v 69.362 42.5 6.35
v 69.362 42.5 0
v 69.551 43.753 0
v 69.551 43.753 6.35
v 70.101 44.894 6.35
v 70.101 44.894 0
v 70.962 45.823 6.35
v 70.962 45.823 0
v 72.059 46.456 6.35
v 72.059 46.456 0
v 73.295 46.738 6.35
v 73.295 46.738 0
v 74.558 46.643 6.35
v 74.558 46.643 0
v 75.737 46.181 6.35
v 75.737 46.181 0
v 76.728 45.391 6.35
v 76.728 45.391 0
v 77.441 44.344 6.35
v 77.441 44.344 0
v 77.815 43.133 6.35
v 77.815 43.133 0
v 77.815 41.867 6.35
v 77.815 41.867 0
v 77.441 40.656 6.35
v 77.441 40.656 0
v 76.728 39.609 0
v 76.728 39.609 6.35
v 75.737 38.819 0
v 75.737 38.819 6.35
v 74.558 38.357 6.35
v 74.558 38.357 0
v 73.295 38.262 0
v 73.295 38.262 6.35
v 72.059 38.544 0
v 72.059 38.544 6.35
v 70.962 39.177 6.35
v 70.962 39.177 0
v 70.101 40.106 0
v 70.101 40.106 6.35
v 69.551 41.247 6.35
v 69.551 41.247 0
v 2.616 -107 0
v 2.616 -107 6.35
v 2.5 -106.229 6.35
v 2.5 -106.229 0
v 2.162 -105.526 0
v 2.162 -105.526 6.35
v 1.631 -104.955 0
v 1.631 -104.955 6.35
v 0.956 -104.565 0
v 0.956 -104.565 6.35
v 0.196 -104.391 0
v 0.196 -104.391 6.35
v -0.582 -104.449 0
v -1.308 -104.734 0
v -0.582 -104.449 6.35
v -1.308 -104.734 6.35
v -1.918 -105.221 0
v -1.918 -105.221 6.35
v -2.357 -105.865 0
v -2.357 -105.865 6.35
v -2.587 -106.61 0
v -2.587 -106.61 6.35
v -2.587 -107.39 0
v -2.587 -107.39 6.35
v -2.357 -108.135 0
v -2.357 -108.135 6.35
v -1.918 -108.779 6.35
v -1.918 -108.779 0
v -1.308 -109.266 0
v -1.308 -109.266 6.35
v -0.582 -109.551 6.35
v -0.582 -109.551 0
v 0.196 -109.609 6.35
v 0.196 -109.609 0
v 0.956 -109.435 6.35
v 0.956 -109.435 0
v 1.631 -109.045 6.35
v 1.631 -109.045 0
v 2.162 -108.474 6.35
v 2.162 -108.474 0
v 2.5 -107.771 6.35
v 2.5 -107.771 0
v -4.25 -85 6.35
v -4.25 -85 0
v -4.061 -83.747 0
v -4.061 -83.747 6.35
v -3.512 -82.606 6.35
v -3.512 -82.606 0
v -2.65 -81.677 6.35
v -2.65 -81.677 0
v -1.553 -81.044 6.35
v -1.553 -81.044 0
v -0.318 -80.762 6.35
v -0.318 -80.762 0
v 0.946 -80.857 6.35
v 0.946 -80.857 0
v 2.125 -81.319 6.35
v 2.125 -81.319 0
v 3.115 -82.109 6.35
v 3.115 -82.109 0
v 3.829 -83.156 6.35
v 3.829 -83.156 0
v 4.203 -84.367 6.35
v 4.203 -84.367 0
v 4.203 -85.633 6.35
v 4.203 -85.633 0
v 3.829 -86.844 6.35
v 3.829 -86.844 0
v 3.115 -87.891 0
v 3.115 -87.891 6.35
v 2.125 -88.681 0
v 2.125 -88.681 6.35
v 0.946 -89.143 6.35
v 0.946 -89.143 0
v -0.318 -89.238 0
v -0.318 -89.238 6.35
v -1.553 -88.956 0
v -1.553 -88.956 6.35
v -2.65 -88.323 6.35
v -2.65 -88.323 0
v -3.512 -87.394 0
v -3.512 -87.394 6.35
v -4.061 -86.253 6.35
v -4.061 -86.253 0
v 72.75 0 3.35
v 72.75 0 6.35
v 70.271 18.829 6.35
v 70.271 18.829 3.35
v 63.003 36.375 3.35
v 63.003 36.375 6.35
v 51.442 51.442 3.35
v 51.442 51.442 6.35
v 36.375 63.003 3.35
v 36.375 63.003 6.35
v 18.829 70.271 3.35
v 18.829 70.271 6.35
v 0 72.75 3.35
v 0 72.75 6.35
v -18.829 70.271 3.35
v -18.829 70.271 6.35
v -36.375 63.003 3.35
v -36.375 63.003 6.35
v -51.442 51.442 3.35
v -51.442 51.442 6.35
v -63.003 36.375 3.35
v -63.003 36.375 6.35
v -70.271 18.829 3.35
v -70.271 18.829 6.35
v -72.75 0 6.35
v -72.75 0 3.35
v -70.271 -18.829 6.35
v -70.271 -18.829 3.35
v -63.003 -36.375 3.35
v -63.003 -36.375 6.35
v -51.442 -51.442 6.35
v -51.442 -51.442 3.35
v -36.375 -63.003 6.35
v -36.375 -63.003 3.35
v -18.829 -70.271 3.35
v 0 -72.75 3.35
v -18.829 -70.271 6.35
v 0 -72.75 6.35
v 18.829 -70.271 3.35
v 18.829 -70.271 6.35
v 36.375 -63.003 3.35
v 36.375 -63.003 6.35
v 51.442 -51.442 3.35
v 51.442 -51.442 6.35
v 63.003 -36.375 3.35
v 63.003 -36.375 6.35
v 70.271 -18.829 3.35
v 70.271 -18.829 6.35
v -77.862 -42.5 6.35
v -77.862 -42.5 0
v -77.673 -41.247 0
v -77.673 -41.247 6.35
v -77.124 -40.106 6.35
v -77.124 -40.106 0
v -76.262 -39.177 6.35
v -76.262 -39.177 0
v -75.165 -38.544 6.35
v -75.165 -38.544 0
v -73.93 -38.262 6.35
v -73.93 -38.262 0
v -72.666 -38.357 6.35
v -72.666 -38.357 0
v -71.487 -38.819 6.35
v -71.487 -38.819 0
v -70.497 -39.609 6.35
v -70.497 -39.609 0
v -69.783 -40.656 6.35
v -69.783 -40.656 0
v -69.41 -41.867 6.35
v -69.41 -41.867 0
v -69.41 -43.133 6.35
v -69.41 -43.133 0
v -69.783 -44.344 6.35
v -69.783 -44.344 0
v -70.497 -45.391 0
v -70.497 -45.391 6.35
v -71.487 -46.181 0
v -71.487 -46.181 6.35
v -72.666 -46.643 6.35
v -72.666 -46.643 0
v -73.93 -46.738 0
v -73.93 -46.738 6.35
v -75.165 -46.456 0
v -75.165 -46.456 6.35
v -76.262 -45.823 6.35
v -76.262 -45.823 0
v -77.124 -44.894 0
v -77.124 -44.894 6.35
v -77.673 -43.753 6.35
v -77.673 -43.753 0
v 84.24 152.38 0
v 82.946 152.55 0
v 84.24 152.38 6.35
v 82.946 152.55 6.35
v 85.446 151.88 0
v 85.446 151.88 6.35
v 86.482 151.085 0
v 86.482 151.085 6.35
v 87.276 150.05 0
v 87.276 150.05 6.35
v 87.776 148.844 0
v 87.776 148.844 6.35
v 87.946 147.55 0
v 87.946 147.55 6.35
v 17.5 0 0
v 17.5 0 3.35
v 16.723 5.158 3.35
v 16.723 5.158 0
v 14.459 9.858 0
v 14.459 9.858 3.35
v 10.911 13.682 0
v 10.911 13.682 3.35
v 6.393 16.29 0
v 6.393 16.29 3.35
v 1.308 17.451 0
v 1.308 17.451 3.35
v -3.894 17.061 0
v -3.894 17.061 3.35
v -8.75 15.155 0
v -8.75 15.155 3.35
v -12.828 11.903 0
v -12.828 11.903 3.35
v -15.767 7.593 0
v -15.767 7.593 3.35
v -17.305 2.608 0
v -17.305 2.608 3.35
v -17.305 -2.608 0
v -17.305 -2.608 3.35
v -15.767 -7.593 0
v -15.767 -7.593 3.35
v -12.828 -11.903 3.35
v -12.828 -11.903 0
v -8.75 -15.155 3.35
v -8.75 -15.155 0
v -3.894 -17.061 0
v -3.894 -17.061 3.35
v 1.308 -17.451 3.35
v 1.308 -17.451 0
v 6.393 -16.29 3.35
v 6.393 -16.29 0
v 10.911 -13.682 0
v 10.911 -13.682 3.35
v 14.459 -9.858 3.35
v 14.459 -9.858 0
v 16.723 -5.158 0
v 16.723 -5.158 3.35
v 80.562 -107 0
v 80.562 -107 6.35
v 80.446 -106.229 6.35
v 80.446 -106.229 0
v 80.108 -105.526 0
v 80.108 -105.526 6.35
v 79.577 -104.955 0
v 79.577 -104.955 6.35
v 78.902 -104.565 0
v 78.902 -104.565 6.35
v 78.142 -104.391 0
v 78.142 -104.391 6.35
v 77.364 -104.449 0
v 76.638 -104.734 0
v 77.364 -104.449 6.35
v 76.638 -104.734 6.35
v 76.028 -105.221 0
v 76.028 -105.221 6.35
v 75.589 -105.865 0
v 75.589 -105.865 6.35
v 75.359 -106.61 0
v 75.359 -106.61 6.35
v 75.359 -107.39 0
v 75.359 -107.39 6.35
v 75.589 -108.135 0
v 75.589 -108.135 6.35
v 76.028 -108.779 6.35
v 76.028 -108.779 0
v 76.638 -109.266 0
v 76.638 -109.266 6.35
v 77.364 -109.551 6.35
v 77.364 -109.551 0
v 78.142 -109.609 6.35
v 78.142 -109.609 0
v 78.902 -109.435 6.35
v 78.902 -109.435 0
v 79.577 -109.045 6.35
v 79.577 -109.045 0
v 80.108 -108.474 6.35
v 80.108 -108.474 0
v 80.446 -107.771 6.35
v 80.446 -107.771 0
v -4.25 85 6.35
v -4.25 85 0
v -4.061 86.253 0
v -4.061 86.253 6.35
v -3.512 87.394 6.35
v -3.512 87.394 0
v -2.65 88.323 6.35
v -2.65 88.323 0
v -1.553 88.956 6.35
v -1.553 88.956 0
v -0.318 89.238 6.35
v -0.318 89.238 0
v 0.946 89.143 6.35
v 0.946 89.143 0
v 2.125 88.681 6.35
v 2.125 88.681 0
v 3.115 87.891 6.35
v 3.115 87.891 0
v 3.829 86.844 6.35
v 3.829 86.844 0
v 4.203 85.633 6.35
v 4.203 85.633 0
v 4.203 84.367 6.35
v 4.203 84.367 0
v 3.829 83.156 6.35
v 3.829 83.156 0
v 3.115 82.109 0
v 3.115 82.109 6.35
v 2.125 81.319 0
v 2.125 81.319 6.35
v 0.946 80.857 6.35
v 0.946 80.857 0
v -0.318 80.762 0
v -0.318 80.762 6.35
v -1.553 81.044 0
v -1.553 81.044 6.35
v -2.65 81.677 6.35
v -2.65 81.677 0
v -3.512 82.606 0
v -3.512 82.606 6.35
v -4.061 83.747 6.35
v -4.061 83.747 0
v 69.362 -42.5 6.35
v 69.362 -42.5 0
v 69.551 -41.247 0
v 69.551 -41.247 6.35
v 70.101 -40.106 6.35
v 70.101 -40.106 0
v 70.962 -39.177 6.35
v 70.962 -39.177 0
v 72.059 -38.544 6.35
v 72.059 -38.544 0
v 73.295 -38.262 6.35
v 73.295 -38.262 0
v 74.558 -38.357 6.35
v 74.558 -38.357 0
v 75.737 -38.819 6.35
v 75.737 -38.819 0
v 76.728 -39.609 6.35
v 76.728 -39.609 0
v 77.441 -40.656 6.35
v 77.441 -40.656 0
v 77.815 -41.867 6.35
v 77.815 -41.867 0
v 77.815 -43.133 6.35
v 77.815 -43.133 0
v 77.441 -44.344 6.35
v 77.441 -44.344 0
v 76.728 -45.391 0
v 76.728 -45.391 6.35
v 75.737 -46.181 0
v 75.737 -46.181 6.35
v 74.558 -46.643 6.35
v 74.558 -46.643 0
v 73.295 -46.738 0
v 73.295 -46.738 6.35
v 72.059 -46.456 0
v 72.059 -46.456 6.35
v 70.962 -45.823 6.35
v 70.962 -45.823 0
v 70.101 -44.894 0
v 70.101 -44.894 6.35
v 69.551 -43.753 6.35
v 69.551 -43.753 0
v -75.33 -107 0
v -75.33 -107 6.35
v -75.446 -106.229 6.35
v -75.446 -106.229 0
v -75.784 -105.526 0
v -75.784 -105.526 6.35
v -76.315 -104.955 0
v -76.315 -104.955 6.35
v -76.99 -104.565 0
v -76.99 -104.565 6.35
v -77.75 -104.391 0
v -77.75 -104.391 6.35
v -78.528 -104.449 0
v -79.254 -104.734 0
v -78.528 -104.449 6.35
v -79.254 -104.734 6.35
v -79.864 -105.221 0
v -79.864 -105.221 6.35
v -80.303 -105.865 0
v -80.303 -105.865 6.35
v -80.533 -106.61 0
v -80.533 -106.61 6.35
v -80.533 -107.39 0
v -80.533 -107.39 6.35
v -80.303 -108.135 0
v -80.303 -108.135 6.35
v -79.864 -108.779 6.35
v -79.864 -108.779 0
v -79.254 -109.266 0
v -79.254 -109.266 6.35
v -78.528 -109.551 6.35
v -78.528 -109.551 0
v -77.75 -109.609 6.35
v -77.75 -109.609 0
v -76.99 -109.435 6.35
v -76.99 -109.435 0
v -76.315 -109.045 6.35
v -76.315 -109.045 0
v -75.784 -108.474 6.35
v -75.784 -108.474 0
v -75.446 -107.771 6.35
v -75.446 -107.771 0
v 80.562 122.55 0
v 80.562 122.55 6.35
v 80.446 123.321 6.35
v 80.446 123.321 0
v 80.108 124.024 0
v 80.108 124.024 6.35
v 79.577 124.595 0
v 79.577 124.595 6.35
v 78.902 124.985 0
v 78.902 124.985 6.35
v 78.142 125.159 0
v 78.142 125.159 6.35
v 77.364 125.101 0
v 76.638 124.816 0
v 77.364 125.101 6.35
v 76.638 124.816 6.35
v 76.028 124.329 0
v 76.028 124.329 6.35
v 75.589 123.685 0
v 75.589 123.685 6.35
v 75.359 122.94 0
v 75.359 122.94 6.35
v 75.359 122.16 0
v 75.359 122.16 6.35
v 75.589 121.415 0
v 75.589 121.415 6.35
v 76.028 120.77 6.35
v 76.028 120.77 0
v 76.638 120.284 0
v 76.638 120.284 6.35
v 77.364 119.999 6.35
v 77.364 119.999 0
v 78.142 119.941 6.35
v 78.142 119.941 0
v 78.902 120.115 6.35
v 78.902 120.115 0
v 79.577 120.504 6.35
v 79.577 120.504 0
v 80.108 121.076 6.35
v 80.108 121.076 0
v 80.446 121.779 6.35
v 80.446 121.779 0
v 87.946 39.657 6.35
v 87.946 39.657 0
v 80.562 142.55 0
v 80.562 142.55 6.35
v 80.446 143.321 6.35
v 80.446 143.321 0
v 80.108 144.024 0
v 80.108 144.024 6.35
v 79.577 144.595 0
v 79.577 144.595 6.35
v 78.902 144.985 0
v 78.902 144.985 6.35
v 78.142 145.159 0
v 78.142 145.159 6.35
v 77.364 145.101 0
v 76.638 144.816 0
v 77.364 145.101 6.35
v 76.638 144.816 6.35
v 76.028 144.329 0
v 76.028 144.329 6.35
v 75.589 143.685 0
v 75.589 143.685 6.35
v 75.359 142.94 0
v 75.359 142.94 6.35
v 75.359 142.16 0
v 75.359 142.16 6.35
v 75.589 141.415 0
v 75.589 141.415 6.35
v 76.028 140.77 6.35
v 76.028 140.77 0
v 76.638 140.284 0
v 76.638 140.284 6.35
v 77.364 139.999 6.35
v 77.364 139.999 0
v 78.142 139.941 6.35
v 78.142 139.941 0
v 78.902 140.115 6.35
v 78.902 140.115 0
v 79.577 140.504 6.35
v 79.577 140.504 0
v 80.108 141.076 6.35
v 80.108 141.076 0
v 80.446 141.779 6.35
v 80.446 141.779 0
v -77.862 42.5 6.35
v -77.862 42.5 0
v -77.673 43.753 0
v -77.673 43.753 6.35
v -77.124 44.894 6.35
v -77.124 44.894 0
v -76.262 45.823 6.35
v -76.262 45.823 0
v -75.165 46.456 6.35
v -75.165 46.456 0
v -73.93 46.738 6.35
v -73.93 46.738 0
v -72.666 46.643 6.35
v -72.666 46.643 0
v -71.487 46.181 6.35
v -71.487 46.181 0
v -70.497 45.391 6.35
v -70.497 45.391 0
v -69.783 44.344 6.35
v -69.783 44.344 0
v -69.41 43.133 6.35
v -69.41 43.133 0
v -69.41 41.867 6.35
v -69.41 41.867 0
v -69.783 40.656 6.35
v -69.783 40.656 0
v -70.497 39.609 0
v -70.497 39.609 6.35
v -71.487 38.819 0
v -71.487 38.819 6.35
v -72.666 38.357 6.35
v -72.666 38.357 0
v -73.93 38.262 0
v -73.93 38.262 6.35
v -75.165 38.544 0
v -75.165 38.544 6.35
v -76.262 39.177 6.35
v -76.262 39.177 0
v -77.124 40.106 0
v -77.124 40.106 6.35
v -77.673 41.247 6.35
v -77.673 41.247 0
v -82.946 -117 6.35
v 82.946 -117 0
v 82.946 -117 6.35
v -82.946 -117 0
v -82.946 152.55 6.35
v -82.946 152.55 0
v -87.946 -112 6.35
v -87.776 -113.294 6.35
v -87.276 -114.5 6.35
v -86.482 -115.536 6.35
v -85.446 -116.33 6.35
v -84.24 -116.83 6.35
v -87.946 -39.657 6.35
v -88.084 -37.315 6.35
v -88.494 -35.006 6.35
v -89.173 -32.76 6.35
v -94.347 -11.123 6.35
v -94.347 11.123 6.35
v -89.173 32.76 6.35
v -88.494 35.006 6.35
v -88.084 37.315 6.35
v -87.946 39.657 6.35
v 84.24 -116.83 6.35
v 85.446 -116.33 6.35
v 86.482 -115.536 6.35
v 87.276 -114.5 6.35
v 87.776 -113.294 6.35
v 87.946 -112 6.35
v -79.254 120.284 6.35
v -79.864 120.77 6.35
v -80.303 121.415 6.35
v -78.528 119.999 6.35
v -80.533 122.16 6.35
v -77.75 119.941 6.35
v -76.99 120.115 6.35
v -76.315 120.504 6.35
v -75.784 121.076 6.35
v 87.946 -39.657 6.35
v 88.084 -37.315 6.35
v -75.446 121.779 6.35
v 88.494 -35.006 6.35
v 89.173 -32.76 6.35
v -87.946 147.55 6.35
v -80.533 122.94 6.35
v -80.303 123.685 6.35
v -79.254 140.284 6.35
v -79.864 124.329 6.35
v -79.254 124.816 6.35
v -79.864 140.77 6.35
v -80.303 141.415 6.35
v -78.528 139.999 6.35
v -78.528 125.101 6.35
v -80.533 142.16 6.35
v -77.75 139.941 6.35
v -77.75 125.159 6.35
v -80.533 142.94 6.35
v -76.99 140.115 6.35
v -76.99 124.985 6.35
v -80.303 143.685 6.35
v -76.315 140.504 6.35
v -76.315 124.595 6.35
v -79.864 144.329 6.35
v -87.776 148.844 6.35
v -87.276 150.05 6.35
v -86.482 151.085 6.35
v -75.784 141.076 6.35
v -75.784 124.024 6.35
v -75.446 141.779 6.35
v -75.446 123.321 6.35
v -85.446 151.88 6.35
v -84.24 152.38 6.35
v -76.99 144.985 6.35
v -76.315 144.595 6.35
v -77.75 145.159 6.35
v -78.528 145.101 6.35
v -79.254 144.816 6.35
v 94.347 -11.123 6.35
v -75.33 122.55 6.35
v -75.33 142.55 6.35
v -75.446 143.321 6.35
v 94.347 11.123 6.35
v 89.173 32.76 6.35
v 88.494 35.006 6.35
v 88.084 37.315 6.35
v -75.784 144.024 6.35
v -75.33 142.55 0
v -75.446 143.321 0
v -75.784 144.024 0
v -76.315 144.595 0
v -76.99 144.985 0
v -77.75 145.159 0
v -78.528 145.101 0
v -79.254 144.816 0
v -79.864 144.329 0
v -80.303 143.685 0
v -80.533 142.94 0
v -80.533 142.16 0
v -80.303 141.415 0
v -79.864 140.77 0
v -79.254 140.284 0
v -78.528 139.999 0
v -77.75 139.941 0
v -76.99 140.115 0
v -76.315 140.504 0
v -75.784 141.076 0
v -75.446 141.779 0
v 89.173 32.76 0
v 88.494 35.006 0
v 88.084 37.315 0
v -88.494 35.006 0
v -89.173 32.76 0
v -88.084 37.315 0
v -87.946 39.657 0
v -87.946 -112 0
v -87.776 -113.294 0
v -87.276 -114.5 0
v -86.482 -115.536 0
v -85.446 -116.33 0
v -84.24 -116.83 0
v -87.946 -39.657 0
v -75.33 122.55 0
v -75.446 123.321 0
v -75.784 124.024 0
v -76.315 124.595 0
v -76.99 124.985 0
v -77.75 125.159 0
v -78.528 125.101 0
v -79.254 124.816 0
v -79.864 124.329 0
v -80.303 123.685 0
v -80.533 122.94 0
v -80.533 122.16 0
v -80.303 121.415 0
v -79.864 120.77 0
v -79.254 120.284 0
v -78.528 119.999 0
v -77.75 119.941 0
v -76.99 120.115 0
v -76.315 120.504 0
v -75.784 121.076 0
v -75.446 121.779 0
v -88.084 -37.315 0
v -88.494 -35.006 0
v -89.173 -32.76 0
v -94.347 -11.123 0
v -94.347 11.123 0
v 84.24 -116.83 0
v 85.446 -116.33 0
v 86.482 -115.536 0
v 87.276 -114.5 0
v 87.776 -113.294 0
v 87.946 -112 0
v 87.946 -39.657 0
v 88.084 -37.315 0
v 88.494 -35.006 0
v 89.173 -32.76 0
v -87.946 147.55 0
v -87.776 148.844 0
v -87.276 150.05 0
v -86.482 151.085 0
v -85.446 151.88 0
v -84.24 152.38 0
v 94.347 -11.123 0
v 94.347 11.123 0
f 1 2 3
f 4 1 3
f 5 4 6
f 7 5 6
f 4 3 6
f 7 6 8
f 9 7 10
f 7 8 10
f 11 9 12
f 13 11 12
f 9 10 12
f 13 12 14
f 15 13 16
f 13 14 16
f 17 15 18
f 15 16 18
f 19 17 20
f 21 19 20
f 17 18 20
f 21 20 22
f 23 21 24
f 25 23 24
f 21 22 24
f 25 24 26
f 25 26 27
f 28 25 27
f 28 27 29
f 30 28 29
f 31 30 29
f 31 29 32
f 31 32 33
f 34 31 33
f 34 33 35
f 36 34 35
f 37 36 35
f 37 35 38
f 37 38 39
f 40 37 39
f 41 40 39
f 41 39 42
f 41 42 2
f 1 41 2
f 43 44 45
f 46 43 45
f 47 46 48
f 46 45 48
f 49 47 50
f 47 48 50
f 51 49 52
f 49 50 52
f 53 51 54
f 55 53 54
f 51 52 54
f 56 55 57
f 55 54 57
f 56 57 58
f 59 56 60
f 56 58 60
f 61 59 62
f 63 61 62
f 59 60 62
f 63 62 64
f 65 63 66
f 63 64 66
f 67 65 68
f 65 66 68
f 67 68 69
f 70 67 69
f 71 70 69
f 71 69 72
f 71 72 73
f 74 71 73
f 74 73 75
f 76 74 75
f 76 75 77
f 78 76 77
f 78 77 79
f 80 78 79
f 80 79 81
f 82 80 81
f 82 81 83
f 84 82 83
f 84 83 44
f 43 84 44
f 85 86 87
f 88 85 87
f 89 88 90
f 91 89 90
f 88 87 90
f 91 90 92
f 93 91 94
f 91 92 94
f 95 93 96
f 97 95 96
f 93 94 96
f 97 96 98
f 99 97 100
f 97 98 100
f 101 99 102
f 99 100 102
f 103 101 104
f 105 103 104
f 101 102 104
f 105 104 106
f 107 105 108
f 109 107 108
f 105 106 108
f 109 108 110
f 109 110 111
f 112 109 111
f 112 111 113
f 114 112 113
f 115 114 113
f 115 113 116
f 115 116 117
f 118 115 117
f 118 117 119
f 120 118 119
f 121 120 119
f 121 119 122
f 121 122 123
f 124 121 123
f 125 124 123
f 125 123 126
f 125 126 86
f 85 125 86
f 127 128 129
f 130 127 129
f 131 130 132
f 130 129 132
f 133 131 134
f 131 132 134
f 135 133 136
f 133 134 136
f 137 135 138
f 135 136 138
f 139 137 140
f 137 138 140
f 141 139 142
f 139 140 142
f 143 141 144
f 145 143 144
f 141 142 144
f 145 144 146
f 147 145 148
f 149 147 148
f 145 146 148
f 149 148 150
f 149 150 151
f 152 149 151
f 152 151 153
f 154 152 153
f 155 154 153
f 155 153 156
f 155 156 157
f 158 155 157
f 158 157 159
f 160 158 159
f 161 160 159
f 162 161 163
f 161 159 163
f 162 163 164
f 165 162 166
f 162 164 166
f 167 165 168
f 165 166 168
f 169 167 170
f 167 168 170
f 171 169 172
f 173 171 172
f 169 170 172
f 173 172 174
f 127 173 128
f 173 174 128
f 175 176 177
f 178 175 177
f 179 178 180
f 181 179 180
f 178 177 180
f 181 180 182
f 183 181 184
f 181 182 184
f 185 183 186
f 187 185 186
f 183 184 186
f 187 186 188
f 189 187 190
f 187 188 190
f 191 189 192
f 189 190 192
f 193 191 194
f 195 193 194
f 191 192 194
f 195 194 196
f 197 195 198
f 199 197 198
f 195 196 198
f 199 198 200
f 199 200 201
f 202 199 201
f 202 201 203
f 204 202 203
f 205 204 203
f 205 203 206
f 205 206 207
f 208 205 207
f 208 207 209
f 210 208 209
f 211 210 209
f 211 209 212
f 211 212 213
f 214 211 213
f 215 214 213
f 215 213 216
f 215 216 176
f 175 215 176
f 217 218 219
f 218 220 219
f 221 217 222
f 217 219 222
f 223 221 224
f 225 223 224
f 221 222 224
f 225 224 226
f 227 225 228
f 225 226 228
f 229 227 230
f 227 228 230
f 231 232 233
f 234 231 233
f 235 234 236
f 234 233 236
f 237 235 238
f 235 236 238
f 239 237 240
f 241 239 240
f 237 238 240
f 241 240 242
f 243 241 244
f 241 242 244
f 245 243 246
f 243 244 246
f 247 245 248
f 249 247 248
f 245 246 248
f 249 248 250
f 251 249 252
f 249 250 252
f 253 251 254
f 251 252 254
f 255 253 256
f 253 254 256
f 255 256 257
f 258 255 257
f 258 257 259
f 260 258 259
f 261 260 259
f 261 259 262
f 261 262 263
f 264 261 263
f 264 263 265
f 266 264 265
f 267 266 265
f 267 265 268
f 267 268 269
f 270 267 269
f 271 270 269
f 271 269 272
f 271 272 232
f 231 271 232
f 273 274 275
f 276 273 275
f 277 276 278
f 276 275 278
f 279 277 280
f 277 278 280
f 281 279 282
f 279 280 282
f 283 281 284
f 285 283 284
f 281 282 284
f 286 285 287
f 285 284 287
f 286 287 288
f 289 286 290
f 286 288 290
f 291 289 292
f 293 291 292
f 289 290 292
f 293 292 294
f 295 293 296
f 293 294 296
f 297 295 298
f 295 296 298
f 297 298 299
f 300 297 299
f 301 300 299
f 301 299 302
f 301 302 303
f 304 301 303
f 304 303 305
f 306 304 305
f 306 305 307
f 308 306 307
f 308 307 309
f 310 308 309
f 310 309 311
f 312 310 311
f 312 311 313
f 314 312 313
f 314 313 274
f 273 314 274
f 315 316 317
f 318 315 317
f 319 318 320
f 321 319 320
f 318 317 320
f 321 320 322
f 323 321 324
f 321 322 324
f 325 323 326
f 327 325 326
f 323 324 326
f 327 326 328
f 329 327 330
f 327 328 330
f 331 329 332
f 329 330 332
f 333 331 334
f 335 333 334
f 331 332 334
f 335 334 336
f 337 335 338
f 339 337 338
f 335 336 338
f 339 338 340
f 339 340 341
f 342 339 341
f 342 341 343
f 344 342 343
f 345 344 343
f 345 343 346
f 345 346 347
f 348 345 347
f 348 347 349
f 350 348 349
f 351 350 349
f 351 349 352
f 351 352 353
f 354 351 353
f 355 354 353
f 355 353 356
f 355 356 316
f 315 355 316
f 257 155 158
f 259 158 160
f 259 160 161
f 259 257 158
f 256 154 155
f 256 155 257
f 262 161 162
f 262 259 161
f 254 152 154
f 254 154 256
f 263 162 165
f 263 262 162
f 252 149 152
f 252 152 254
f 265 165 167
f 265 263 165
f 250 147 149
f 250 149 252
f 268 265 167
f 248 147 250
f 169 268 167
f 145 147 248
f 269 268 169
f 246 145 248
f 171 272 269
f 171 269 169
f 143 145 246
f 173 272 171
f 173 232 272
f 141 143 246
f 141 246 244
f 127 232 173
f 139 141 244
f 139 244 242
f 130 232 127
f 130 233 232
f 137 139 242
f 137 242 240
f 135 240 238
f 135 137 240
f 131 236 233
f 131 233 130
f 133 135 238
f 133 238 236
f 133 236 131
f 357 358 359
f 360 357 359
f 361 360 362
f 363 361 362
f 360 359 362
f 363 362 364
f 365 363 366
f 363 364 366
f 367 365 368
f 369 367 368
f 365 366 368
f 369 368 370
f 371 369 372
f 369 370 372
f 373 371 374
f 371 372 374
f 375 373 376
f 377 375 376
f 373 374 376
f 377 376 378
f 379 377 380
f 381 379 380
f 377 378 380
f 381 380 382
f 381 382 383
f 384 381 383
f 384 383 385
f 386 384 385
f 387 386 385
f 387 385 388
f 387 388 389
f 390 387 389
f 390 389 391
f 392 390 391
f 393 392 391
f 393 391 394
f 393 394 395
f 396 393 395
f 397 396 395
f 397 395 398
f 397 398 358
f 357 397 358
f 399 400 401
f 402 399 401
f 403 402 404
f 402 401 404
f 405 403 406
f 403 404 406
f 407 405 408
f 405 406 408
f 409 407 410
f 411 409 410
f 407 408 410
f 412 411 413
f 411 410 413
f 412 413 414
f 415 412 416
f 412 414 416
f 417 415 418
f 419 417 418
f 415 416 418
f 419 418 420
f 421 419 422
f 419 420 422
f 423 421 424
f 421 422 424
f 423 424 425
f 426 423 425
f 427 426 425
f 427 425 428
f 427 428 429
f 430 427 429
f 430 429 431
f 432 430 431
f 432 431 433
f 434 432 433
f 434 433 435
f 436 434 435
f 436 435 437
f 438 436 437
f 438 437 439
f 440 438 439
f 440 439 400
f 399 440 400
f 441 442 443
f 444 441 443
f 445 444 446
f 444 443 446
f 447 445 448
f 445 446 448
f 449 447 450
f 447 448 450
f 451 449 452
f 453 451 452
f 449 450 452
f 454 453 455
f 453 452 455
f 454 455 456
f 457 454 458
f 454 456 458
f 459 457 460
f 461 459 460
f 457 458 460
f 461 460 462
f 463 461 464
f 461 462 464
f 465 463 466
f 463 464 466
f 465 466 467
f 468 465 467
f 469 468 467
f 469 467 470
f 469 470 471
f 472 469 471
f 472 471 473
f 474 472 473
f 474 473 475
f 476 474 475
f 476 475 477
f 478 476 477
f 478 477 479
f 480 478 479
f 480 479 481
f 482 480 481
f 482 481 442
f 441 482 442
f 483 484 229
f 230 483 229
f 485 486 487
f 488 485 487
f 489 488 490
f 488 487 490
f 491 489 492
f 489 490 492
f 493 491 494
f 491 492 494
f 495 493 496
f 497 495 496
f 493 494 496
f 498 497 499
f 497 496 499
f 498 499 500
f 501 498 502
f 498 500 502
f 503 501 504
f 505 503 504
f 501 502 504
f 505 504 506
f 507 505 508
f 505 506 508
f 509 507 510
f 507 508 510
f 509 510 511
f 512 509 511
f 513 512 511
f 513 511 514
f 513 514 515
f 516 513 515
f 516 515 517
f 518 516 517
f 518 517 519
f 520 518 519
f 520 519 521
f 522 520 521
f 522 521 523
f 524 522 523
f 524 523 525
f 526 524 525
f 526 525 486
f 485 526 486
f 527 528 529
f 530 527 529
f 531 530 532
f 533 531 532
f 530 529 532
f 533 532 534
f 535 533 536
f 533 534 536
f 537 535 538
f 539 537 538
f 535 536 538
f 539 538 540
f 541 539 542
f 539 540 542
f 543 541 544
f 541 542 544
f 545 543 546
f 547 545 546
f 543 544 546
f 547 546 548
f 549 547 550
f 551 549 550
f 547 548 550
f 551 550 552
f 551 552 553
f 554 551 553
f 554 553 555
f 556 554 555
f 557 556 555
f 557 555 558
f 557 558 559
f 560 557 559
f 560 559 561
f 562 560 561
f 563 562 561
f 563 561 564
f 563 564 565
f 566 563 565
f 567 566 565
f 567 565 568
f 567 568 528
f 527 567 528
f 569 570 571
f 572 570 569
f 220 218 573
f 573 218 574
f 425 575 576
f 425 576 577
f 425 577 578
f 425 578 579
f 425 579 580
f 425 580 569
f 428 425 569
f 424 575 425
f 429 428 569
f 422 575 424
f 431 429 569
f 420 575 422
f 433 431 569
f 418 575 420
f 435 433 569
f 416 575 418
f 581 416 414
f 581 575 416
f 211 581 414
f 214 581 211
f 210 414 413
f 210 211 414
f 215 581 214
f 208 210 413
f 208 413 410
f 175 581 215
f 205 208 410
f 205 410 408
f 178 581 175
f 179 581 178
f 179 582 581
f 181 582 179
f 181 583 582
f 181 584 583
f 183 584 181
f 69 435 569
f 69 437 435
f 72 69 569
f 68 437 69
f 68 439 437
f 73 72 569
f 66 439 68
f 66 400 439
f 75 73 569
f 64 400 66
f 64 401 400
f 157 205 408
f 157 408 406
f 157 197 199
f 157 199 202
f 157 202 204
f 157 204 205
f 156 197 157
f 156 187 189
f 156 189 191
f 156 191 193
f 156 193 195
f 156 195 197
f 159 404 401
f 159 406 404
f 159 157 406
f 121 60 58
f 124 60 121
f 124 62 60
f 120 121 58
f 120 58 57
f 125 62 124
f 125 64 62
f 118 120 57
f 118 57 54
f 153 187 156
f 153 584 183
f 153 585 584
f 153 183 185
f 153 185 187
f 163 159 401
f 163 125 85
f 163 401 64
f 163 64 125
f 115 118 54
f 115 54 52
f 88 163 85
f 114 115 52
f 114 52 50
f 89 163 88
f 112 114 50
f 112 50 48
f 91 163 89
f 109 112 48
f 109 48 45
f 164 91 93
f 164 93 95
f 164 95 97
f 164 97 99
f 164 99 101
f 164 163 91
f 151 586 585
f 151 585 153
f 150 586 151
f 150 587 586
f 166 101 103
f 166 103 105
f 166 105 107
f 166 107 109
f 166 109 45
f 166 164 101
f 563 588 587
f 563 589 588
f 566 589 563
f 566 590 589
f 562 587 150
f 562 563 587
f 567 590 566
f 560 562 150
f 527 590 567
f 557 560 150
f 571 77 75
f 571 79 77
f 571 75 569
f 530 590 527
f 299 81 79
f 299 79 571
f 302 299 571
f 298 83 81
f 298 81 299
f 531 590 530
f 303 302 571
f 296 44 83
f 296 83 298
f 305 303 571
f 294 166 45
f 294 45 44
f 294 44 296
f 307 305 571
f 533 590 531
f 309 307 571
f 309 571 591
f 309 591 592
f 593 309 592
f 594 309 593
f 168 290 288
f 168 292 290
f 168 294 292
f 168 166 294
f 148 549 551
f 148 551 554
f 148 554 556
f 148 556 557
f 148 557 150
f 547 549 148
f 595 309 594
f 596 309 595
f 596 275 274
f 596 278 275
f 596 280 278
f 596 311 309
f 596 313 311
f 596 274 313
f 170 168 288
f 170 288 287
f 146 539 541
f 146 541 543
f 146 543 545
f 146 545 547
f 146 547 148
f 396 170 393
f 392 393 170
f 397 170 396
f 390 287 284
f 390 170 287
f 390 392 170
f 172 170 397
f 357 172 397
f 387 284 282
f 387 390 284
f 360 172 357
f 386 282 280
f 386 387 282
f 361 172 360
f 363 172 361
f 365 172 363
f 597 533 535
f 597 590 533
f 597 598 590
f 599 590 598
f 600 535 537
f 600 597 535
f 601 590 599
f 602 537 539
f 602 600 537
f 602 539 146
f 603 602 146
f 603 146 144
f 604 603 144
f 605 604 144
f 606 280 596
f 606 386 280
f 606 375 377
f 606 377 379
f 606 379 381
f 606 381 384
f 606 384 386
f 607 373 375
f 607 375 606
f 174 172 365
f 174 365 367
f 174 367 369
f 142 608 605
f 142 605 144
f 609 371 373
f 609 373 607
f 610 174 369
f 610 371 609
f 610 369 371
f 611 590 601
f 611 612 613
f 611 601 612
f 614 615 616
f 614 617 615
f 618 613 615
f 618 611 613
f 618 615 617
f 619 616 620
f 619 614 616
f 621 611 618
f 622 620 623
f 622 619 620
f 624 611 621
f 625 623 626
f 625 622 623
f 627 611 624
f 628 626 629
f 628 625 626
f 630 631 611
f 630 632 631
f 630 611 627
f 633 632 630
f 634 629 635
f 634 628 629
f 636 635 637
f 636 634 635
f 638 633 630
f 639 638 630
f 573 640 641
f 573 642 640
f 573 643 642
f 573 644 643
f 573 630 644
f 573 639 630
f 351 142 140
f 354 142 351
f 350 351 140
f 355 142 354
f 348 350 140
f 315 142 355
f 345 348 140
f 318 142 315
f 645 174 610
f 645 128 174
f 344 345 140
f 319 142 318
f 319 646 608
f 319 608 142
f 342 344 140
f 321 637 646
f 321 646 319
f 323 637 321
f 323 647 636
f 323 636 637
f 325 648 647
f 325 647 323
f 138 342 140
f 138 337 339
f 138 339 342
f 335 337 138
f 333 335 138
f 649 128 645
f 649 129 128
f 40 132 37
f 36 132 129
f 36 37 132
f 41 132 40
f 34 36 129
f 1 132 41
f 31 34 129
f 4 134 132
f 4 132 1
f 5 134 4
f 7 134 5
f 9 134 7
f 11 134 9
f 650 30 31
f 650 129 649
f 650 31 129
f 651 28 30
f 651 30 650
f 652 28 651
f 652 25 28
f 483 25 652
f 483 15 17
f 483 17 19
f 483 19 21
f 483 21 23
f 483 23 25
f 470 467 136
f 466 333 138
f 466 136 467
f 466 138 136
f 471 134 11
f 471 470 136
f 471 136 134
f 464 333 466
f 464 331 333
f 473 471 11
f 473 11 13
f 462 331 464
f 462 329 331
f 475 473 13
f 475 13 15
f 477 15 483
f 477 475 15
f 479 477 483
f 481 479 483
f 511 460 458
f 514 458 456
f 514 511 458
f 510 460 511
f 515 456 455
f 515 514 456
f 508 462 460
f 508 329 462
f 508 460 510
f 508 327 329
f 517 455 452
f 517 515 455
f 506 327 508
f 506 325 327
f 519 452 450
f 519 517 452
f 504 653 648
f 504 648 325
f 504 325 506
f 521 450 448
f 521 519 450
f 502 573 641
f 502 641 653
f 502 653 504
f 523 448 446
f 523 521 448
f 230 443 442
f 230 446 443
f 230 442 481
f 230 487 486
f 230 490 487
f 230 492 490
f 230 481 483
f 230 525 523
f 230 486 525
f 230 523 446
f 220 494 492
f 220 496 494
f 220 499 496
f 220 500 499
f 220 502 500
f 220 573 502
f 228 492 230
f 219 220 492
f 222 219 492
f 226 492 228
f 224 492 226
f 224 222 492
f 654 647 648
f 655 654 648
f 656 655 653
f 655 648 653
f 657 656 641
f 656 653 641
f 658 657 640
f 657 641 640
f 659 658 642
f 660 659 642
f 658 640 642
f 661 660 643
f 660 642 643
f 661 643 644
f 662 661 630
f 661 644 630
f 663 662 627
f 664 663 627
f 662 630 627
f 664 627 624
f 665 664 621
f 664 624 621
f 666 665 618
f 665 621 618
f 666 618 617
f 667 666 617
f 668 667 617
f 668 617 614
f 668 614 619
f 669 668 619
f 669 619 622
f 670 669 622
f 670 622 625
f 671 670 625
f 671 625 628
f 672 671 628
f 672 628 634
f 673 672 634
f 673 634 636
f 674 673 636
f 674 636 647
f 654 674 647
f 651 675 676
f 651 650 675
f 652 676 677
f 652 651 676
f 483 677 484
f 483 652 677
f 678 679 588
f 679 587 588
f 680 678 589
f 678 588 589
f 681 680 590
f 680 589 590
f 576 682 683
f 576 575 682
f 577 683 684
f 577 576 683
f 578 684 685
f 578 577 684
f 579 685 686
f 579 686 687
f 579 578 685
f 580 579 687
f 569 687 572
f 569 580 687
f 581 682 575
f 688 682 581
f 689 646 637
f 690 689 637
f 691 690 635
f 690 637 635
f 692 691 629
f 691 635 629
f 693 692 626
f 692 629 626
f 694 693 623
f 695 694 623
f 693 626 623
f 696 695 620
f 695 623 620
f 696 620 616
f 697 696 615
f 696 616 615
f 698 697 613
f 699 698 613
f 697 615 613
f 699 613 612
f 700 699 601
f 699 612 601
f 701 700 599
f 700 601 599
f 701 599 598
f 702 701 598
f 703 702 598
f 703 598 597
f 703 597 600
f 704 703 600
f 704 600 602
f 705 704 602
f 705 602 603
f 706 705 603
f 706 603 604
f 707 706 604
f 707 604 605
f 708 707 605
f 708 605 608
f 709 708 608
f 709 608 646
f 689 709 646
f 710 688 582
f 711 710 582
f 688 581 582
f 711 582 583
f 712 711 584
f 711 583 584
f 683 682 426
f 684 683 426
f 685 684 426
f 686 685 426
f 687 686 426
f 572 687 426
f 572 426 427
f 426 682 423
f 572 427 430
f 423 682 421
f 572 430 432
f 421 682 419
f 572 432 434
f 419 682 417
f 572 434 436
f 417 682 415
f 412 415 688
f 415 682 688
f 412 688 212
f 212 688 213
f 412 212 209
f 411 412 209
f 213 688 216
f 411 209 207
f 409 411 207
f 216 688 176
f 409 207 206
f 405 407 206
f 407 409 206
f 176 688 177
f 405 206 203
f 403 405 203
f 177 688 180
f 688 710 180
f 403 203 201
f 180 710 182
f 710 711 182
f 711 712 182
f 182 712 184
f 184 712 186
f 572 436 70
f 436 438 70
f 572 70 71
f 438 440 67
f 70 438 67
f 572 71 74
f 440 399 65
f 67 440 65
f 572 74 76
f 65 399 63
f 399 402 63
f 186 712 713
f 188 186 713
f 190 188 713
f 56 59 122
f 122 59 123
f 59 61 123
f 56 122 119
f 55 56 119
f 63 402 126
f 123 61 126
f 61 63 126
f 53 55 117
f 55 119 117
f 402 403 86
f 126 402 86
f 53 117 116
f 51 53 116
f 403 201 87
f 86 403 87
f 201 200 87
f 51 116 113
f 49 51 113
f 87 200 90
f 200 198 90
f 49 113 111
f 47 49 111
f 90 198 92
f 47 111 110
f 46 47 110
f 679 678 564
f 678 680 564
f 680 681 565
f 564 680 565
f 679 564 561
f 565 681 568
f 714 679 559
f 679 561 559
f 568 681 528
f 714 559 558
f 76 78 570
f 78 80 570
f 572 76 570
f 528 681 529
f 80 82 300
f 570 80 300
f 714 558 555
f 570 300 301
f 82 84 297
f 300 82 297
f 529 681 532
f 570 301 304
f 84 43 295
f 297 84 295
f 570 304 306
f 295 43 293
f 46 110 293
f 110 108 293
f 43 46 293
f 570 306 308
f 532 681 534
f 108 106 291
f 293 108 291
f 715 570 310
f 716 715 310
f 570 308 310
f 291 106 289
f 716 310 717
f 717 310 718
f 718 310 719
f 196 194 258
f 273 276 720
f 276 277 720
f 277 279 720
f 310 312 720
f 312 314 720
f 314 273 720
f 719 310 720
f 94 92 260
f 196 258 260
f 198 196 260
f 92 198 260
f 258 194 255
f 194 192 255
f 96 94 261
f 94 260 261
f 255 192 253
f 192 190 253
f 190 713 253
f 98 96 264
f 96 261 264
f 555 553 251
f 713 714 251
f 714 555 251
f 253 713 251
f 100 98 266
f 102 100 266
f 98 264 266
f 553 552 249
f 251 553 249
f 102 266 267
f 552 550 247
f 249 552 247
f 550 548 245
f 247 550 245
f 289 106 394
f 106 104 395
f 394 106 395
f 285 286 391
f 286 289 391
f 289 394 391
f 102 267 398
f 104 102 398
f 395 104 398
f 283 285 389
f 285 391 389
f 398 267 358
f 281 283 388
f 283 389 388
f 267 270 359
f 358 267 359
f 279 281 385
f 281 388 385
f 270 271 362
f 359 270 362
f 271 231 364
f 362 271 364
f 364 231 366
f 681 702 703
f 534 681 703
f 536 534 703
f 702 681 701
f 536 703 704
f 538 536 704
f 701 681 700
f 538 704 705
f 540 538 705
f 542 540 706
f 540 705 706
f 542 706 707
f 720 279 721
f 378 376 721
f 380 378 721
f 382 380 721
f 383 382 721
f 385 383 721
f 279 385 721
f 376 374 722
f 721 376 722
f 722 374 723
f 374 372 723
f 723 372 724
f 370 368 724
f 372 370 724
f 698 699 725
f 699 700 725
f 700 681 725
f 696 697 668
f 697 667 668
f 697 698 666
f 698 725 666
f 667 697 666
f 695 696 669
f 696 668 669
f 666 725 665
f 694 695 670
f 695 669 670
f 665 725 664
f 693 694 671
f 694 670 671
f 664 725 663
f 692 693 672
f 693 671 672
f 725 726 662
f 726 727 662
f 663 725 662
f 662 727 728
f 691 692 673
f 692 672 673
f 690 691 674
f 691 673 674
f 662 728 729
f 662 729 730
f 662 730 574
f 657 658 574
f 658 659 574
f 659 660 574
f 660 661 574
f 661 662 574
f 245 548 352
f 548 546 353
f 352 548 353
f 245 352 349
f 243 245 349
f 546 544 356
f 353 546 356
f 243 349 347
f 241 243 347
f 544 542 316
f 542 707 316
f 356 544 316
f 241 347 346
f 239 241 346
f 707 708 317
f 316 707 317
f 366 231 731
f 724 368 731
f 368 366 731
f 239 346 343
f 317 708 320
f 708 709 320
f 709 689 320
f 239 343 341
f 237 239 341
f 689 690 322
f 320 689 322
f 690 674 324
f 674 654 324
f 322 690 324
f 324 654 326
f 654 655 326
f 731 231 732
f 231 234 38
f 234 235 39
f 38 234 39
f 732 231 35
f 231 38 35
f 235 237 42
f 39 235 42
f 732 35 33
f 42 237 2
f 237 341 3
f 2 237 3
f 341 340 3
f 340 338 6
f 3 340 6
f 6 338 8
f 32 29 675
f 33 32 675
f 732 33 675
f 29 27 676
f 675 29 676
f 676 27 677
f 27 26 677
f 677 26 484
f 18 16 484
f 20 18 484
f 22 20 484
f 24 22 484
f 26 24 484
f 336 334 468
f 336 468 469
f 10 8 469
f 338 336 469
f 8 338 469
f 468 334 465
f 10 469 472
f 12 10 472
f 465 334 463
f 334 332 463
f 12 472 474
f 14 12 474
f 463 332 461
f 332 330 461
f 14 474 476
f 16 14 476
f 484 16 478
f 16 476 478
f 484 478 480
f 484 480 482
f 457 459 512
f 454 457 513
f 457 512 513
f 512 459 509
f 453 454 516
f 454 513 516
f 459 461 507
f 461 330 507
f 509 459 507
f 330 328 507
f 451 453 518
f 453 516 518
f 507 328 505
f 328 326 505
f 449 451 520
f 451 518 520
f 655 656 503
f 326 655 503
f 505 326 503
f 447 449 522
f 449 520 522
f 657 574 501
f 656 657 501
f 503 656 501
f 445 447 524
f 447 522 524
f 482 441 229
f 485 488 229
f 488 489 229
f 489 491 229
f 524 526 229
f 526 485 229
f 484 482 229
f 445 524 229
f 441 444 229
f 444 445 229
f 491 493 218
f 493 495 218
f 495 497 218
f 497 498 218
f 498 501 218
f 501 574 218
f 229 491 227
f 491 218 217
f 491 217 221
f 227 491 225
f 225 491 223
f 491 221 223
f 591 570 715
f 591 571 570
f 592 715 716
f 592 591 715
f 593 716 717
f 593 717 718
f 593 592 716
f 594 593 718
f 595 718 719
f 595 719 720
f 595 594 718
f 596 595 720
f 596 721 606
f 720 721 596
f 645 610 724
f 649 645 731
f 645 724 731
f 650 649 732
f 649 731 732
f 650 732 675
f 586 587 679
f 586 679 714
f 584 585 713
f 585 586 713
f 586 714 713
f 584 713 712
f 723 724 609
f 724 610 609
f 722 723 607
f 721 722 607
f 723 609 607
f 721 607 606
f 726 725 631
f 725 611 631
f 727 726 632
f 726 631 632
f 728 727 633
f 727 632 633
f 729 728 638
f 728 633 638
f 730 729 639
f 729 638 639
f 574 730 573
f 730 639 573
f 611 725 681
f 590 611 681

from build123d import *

# Parameters (mm, degrees)
SKETCH1_R                    = 95
BOSS_EXTRUDE1_DEPTH          = 6.35
BOSS_EXTRUDE2_START          = -6.35
BOSS_EXTRUDE2_DEPTH          = 6.35
SKETCH4_R                    = 72.75
CUT_EXTRUDE2_DEPTH           = 3
CUT_EXTRUDE3_REACH           = 152.749
SKETCH5_R                    = 17.5
TAP_DRILL_FOR_M10X1_5_TAP1_D = 8.5
CUT_EXTRUDE4_REACH           = 152.845
SKETCH3_R                    = 2.6162
BOSS_EXTRUDE3_START          = -6.35
BOSS_EXTRUDE3_DEPTH          = 6.35
CUT_EXTRUDE5_REACH           = 181.824
SKETCH9_R                    = 2.6162
FILLET1_R                    = 20
FILLET2_R                    = 5


with BuildPart() as part:
    # Sketch1 → Boss-Extrude1 (new body)
    with BuildSketch(Plane.XY):
        Circle(SKETCH1_R)
    extrude(amount=BOSS_EXTRUDE1_DEPTH)

    # Sketch2 → Boss-Extrude2 (add)
    with BuildSketch(Plane.XY.offset(6.35).offset(BOSS_EXTRUDE2_START)):
        with BuildLine():
            Line((87.946, -117), (-87.946, -117))
            Line((-87.946, -117), (-87.946, -35.923544981))
            ThreePointArc((-87.946, -35.923544981), (0, -95), (87.946, -35.923544981))
            Line((87.946, -35.923544981), (87.946, -117))
        make_face()
    extrude(amount=BOSS_EXTRUDE2_DEPTH)

    # Sketch4 → Cut-Extrude2 (cut)
    with BuildSketch(Plane.XY.offset(6.35)):
        Circle(SKETCH4_R)
    extrude(amount=-CUT_EXTRUDE2_DEPTH, mode=Mode.SUBTRACT)

    # Sketch5 → Cut-Extrude3 (cut, up to next)
    with BuildSketch(Plane.XY.offset(3.35), mode=Mode.PRIVATE) as cut_extrude3_sk1:
        Circle(SKETCH5_R)
    cut_extrude3_tool1 = extrude(cut_extrude3_sk1.sketch, amount=-CUT_EXTRUDE3_REACH, mode=Mode.PRIVATE) & part.part
    add(cut_extrude3_tool1.solids().sort_by_distance((0, 0, 3.35))[0], mode=Mode.SUBTRACT)

    # Tap Drill for M10x1.5 Tap1 (through all)
    with Locations(Plane(origin=(0, 85, 6.35), x_dir=(1, 0, 0), z_dir=(0, 0, 1))):
        with Locations((0, 0), (73.612159322, -42.5), (73.612159322, -127.5), (0, -170), (-73.612159322, -127.5), (-73.612159322, -42.5)):
            Hole(TAP_DRILL_FOR_M10X1_5_TAP1_D / 2)

    # Sketch3 → Cut-Extrude4 (cut, up to next)
    with BuildSketch(Plane.XY.offset(6.35), mode=Mode.PRIVATE) as cut_extrude4_sk1:
        with Locations((-77.946, -107)):
            Circle(SKETCH3_R)
    cut_extrude4_tool1 = extrude(cut_extrude4_sk1.sketch, amount=-CUT_EXTRUDE4_REACH, mode=Mode.PRIVATE) & part.part
    # Sketch3 → Cut-Extrude4 (cut, up to next)
    with BuildSketch(Plane.XY.offset(6.35), mode=Mode.PRIVATE) as cut_extrude4_sk2:
        with Locations((77.946, -107)):
            Circle(SKETCH3_R)
    cut_extrude4_tool2 = extrude(cut_extrude4_sk2.sketch, amount=-CUT_EXTRUDE4_REACH, mode=Mode.PRIVATE) & part.part
    # Sketch3 → Cut-Extrude4 (cut, up to next)
    with BuildSketch(Plane.XY.offset(6.35), mode=Mode.PRIVATE) as cut_extrude4_sk3:
        with Locations((0, -107)):
            Circle(SKETCH3_R)
    cut_extrude4_tool3 = extrude(cut_extrude4_sk3.sketch, amount=-CUT_EXTRUDE4_REACH, mode=Mode.PRIVATE) & part.part
    add(cut_extrude4_tool1.solids().sort_by_distance((-77.946, -107, 6.35))[0], mode=Mode.SUBTRACT)
    add(cut_extrude4_tool2.solids().sort_by_distance((77.946, -107, 6.35))[0], mode=Mode.SUBTRACT)
    add(cut_extrude4_tool3.solids().sort_by_distance((0, -107, 6.35))[0], mode=Mode.SUBTRACT)

    # Sketch8 → Boss-Extrude3 (add)
    with BuildSketch(Plane.XY.offset(6.35).offset(BOSS_EXTRUDE3_START)):
        with BuildLine():
            Line((87.946, 152.5499), (-87.946, 152.5499))
            Line((-87.946, 152.5499), (-87.946, 35.923544981))
            ThreePointArc((-87.946, 35.923544981), (0, 95), (87.946, 35.923544981))
            Line((87.946, 35.923544981), (87.946, 152.5499))
        make_face()
    extrude(amount=BOSS_EXTRUDE3_DEPTH)

    # Sketch9 → Cut-Extrude5 (cut, up to next)
    with BuildSketch(Plane.XY.offset(6.35), mode=Mode.PRIVATE) as cut_extrude5_sk1:
        with Locations((-77.946, 142.5499)):
            Circle(SKETCH9_R)
    cut_extrude5_tool1 = extrude(cut_extrude5_sk1.sketch, amount=-CUT_EXTRUDE5_REACH, mode=Mode.PRIVATE) & part.part
    # Sketch9 → Cut-Extrude5 (cut, up to next)
    with BuildSketch(Plane.XY.offset(6.35), mode=Mode.PRIVATE) as cut_extrude5_sk2:
        with Locations((-77.946, 122.5499)):
            Circle(SKETCH9_R)
    cut_extrude5_tool2 = extrude(cut_extrude5_sk2.sketch, amount=-CUT_EXTRUDE5_REACH, mode=Mode.PRIVATE) & part.part
    # Sketch9 → Cut-Extrude5 (cut, up to next)
    with BuildSketch(Plane.XY.offset(6.35), mode=Mode.PRIVATE) as cut_extrude5_sk3:
        with Locations((77.946, 122.5499)):
            Circle(SKETCH9_R)
    cut_extrude5_tool3 = extrude(cut_extrude5_sk3.sketch, amount=-CUT_EXTRUDE5_REACH, mode=Mode.PRIVATE) & part.part
    # Sketch9 → Cut-Extrude5 (cut, up to next)
    with BuildSketch(Plane.XY.offset(6.35), mode=Mode.PRIVATE) as cut_extrude5_sk4:
        with Locations((77.946, 142.5499)):
            Circle(SKETCH9_R)
    cut_extrude5_tool4 = extrude(cut_extrude5_sk4.sketch, amount=-CUT_EXTRUDE5_REACH, mode=Mode.PRIVATE) & part.part
    add(cut_extrude5_tool1.solids().sort_by_distance((-77.946, 142.5499, 6.35))[0], mode=Mode.SUBTRACT)
    add(cut_extrude5_tool2.solids().sort_by_distance((-77.946, 122.5499, 6.35))[0], mode=Mode.SUBTRACT)
    add(cut_extrude5_tool3.solids().sort_by_distance((77.946, 122.5499, 6.35))[0], mode=Mode.SUBTRACT)
    add(cut_extrude5_tool4.solids().sort_by_distance((77.946, 142.5499, 6.35))[0], mode=Mode.SUBTRACT)

    # Fillet1
    fillet1_edges = [part.edges().sort_by_distance(p)[0] for p in [
        (-87.946, -35.923544981, 3.175),
        (87.946, -35.923544981, 3.175),
        (-87.946, 35.923544981, 3.175),
        (87.946, 35.923544981, 3.175),
    ]]
    fillet(fillet1_edges, radius=FILLET1_R)

    # Fillet2
    fillet2_edges = [part.edges().sort_by_distance(p)[0] for p in [
        (-87.946, -117, 3.175),
        (87.946, -117, 3.175),
        (-87.946, 152.5499, 3.175),
        (87.946, 152.5499, 3.175),
    ]]
    fillet(fillet2_edges, radius=FILLET2_R)


solid = part.part
